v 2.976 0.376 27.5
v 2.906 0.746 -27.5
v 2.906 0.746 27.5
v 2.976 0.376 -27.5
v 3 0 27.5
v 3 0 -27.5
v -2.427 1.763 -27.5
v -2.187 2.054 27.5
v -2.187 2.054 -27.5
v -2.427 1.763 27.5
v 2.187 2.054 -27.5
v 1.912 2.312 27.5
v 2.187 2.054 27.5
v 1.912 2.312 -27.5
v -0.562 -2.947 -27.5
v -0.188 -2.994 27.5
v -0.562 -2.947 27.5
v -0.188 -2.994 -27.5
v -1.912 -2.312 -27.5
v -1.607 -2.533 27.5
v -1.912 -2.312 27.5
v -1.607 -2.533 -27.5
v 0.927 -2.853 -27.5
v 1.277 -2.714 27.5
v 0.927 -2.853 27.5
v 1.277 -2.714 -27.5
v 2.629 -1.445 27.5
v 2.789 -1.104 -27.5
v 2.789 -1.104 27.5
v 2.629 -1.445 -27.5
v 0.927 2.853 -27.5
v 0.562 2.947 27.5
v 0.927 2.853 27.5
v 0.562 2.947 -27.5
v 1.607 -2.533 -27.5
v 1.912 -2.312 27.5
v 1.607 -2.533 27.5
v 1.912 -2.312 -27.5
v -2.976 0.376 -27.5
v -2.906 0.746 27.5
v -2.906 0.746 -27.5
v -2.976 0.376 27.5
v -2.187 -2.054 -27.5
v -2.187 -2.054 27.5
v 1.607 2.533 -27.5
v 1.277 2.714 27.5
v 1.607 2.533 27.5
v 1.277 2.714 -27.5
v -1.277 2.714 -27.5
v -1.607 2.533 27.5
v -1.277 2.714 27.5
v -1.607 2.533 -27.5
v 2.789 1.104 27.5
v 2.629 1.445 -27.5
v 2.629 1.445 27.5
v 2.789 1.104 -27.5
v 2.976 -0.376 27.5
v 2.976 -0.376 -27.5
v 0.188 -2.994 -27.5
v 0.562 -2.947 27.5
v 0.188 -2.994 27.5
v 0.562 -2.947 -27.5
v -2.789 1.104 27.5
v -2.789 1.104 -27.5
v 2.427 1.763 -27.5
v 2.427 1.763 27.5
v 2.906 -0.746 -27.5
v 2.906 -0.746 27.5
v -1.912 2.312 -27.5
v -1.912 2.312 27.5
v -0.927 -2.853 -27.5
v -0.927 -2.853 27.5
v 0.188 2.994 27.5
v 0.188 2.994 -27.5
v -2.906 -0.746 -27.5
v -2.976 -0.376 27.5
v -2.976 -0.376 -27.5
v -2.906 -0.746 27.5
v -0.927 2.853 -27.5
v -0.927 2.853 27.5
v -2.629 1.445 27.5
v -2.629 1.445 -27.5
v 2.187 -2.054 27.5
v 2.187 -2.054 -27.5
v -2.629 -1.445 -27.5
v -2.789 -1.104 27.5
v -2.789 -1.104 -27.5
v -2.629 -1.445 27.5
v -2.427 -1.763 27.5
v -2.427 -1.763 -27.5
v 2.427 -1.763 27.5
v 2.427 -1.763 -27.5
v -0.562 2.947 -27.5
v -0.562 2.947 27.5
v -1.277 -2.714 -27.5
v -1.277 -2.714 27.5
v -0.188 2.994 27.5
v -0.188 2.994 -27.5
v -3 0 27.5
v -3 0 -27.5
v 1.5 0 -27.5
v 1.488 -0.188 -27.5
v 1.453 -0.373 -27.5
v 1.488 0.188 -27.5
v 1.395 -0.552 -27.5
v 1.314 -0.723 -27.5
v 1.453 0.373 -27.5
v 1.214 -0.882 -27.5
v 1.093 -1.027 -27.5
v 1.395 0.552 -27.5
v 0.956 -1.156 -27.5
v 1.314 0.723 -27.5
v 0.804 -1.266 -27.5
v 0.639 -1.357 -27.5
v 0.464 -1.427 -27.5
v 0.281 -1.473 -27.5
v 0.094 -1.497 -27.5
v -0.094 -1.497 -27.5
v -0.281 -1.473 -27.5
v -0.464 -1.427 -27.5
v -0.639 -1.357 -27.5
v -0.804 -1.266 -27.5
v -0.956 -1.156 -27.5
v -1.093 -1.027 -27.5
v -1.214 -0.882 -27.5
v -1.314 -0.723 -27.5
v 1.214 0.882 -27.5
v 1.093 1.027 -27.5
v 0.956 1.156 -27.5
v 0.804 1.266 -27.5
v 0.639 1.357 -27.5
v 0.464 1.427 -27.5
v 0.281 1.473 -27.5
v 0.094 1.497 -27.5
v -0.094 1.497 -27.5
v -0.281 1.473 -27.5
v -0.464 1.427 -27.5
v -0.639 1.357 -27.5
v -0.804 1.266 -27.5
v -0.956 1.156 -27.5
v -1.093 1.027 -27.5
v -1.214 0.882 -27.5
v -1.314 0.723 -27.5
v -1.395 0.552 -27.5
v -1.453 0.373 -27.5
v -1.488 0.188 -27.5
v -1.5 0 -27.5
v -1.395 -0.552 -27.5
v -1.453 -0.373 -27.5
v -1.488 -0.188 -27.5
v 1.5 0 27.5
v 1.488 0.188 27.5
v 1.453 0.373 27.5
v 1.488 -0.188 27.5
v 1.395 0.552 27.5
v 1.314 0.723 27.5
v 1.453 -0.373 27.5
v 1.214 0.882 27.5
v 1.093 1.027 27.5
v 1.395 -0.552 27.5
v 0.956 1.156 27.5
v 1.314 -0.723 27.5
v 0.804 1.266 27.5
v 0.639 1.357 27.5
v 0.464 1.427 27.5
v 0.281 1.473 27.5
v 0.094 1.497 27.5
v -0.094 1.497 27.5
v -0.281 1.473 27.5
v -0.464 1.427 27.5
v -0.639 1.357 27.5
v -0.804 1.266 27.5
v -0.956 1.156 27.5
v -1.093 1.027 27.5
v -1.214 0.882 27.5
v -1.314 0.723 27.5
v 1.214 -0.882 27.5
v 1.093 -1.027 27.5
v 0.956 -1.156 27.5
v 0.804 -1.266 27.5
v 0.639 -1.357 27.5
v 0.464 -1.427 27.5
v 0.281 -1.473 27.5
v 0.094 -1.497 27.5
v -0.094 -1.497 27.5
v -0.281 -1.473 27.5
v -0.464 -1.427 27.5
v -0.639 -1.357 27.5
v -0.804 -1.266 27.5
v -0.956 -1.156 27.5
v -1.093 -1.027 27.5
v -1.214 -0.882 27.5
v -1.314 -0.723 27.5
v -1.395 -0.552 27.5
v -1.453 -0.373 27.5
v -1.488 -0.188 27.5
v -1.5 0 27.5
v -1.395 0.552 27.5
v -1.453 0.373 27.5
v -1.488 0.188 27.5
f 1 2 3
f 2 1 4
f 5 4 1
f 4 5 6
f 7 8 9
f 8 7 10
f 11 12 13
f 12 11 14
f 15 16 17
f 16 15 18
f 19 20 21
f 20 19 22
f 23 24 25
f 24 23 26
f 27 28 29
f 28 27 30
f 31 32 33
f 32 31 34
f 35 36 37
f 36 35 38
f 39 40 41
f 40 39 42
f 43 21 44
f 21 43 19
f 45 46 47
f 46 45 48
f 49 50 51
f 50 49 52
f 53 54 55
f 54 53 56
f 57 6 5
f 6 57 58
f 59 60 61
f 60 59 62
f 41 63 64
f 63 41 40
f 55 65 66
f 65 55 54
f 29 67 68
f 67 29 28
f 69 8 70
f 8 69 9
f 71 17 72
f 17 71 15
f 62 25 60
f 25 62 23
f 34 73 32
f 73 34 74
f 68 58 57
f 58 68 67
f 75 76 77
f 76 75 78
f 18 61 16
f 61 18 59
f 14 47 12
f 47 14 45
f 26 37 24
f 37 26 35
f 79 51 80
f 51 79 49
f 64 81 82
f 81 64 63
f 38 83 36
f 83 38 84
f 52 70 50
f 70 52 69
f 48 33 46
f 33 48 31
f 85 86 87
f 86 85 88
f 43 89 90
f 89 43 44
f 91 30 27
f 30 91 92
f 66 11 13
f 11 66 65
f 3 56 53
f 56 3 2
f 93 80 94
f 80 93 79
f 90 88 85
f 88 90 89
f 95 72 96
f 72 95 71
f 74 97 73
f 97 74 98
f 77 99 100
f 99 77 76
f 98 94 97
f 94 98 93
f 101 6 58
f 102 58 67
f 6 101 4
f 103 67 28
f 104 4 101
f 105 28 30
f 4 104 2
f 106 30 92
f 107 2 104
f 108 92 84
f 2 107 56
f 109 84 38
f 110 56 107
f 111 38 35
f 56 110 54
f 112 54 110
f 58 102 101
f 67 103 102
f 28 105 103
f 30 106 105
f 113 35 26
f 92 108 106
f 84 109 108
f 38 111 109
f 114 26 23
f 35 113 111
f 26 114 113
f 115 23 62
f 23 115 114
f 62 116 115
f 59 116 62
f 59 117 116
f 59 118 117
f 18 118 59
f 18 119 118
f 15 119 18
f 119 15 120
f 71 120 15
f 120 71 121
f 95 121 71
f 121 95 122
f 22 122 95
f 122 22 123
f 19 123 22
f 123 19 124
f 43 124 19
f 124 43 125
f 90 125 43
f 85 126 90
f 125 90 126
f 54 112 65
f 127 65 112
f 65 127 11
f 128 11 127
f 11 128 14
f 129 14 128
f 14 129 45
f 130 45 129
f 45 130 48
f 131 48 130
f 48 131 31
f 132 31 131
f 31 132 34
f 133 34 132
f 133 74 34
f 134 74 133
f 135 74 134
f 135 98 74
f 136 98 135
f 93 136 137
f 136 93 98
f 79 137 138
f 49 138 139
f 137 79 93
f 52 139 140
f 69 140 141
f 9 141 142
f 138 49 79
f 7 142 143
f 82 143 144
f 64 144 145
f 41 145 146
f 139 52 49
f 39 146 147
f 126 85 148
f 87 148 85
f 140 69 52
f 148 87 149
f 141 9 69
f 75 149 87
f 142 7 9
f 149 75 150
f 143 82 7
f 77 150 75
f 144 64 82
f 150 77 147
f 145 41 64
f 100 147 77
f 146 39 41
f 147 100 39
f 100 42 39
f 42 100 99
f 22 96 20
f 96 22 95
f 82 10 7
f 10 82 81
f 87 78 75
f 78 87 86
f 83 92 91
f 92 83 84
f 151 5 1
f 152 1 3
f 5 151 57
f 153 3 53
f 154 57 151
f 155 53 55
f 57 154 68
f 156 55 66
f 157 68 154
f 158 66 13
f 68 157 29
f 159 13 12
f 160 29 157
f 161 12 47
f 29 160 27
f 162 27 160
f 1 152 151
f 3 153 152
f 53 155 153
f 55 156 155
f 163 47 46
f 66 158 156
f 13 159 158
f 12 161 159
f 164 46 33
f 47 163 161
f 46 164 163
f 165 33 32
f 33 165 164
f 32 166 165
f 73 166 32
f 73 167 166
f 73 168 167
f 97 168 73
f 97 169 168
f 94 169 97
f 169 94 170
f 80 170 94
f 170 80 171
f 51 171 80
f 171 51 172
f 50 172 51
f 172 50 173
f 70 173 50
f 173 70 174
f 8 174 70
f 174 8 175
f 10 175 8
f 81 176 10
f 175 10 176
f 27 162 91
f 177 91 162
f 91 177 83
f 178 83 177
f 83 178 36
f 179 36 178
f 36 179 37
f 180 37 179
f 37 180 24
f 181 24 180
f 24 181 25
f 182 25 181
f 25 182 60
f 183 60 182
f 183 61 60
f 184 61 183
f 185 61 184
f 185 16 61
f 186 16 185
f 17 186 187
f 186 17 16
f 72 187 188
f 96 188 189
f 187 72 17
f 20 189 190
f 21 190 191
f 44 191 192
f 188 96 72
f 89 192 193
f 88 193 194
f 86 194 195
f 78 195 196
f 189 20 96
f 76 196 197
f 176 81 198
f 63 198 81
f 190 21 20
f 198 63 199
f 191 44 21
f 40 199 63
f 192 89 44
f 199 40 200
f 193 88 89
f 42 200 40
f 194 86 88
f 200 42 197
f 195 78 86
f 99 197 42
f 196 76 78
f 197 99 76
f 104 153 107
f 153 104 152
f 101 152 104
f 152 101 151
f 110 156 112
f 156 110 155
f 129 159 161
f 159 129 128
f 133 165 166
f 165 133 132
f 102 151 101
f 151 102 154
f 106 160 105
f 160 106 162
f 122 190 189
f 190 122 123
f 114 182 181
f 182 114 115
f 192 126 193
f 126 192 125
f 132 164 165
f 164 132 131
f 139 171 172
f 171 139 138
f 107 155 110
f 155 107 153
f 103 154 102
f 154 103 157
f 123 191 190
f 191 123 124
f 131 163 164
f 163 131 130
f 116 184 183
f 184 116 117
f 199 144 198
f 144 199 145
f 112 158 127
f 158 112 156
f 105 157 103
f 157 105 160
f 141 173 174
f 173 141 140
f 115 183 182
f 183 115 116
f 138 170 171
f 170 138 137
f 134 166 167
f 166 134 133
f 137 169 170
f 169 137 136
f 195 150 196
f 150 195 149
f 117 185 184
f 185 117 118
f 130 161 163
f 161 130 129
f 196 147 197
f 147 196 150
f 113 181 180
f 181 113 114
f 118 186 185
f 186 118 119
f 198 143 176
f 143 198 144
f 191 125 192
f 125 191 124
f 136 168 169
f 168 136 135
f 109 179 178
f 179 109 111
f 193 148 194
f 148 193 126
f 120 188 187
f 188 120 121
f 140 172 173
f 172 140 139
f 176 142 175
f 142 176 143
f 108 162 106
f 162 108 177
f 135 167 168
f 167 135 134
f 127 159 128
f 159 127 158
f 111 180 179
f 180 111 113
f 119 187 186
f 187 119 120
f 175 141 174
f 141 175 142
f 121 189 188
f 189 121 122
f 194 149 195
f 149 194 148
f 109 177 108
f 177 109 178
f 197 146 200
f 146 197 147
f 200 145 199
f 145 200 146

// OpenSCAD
$fn = 50;


difference() {
	union() {
		translate(v = [0, 0, -27.5000000000]) {
			cylinder(h = 55, r = 3.0000000000);
		}
	}
	union() {
		translate(v = [0, 0, -100.0000000000]) {
			cylinder(h = 200, r = 1.5000000000);
		}
	}
}
